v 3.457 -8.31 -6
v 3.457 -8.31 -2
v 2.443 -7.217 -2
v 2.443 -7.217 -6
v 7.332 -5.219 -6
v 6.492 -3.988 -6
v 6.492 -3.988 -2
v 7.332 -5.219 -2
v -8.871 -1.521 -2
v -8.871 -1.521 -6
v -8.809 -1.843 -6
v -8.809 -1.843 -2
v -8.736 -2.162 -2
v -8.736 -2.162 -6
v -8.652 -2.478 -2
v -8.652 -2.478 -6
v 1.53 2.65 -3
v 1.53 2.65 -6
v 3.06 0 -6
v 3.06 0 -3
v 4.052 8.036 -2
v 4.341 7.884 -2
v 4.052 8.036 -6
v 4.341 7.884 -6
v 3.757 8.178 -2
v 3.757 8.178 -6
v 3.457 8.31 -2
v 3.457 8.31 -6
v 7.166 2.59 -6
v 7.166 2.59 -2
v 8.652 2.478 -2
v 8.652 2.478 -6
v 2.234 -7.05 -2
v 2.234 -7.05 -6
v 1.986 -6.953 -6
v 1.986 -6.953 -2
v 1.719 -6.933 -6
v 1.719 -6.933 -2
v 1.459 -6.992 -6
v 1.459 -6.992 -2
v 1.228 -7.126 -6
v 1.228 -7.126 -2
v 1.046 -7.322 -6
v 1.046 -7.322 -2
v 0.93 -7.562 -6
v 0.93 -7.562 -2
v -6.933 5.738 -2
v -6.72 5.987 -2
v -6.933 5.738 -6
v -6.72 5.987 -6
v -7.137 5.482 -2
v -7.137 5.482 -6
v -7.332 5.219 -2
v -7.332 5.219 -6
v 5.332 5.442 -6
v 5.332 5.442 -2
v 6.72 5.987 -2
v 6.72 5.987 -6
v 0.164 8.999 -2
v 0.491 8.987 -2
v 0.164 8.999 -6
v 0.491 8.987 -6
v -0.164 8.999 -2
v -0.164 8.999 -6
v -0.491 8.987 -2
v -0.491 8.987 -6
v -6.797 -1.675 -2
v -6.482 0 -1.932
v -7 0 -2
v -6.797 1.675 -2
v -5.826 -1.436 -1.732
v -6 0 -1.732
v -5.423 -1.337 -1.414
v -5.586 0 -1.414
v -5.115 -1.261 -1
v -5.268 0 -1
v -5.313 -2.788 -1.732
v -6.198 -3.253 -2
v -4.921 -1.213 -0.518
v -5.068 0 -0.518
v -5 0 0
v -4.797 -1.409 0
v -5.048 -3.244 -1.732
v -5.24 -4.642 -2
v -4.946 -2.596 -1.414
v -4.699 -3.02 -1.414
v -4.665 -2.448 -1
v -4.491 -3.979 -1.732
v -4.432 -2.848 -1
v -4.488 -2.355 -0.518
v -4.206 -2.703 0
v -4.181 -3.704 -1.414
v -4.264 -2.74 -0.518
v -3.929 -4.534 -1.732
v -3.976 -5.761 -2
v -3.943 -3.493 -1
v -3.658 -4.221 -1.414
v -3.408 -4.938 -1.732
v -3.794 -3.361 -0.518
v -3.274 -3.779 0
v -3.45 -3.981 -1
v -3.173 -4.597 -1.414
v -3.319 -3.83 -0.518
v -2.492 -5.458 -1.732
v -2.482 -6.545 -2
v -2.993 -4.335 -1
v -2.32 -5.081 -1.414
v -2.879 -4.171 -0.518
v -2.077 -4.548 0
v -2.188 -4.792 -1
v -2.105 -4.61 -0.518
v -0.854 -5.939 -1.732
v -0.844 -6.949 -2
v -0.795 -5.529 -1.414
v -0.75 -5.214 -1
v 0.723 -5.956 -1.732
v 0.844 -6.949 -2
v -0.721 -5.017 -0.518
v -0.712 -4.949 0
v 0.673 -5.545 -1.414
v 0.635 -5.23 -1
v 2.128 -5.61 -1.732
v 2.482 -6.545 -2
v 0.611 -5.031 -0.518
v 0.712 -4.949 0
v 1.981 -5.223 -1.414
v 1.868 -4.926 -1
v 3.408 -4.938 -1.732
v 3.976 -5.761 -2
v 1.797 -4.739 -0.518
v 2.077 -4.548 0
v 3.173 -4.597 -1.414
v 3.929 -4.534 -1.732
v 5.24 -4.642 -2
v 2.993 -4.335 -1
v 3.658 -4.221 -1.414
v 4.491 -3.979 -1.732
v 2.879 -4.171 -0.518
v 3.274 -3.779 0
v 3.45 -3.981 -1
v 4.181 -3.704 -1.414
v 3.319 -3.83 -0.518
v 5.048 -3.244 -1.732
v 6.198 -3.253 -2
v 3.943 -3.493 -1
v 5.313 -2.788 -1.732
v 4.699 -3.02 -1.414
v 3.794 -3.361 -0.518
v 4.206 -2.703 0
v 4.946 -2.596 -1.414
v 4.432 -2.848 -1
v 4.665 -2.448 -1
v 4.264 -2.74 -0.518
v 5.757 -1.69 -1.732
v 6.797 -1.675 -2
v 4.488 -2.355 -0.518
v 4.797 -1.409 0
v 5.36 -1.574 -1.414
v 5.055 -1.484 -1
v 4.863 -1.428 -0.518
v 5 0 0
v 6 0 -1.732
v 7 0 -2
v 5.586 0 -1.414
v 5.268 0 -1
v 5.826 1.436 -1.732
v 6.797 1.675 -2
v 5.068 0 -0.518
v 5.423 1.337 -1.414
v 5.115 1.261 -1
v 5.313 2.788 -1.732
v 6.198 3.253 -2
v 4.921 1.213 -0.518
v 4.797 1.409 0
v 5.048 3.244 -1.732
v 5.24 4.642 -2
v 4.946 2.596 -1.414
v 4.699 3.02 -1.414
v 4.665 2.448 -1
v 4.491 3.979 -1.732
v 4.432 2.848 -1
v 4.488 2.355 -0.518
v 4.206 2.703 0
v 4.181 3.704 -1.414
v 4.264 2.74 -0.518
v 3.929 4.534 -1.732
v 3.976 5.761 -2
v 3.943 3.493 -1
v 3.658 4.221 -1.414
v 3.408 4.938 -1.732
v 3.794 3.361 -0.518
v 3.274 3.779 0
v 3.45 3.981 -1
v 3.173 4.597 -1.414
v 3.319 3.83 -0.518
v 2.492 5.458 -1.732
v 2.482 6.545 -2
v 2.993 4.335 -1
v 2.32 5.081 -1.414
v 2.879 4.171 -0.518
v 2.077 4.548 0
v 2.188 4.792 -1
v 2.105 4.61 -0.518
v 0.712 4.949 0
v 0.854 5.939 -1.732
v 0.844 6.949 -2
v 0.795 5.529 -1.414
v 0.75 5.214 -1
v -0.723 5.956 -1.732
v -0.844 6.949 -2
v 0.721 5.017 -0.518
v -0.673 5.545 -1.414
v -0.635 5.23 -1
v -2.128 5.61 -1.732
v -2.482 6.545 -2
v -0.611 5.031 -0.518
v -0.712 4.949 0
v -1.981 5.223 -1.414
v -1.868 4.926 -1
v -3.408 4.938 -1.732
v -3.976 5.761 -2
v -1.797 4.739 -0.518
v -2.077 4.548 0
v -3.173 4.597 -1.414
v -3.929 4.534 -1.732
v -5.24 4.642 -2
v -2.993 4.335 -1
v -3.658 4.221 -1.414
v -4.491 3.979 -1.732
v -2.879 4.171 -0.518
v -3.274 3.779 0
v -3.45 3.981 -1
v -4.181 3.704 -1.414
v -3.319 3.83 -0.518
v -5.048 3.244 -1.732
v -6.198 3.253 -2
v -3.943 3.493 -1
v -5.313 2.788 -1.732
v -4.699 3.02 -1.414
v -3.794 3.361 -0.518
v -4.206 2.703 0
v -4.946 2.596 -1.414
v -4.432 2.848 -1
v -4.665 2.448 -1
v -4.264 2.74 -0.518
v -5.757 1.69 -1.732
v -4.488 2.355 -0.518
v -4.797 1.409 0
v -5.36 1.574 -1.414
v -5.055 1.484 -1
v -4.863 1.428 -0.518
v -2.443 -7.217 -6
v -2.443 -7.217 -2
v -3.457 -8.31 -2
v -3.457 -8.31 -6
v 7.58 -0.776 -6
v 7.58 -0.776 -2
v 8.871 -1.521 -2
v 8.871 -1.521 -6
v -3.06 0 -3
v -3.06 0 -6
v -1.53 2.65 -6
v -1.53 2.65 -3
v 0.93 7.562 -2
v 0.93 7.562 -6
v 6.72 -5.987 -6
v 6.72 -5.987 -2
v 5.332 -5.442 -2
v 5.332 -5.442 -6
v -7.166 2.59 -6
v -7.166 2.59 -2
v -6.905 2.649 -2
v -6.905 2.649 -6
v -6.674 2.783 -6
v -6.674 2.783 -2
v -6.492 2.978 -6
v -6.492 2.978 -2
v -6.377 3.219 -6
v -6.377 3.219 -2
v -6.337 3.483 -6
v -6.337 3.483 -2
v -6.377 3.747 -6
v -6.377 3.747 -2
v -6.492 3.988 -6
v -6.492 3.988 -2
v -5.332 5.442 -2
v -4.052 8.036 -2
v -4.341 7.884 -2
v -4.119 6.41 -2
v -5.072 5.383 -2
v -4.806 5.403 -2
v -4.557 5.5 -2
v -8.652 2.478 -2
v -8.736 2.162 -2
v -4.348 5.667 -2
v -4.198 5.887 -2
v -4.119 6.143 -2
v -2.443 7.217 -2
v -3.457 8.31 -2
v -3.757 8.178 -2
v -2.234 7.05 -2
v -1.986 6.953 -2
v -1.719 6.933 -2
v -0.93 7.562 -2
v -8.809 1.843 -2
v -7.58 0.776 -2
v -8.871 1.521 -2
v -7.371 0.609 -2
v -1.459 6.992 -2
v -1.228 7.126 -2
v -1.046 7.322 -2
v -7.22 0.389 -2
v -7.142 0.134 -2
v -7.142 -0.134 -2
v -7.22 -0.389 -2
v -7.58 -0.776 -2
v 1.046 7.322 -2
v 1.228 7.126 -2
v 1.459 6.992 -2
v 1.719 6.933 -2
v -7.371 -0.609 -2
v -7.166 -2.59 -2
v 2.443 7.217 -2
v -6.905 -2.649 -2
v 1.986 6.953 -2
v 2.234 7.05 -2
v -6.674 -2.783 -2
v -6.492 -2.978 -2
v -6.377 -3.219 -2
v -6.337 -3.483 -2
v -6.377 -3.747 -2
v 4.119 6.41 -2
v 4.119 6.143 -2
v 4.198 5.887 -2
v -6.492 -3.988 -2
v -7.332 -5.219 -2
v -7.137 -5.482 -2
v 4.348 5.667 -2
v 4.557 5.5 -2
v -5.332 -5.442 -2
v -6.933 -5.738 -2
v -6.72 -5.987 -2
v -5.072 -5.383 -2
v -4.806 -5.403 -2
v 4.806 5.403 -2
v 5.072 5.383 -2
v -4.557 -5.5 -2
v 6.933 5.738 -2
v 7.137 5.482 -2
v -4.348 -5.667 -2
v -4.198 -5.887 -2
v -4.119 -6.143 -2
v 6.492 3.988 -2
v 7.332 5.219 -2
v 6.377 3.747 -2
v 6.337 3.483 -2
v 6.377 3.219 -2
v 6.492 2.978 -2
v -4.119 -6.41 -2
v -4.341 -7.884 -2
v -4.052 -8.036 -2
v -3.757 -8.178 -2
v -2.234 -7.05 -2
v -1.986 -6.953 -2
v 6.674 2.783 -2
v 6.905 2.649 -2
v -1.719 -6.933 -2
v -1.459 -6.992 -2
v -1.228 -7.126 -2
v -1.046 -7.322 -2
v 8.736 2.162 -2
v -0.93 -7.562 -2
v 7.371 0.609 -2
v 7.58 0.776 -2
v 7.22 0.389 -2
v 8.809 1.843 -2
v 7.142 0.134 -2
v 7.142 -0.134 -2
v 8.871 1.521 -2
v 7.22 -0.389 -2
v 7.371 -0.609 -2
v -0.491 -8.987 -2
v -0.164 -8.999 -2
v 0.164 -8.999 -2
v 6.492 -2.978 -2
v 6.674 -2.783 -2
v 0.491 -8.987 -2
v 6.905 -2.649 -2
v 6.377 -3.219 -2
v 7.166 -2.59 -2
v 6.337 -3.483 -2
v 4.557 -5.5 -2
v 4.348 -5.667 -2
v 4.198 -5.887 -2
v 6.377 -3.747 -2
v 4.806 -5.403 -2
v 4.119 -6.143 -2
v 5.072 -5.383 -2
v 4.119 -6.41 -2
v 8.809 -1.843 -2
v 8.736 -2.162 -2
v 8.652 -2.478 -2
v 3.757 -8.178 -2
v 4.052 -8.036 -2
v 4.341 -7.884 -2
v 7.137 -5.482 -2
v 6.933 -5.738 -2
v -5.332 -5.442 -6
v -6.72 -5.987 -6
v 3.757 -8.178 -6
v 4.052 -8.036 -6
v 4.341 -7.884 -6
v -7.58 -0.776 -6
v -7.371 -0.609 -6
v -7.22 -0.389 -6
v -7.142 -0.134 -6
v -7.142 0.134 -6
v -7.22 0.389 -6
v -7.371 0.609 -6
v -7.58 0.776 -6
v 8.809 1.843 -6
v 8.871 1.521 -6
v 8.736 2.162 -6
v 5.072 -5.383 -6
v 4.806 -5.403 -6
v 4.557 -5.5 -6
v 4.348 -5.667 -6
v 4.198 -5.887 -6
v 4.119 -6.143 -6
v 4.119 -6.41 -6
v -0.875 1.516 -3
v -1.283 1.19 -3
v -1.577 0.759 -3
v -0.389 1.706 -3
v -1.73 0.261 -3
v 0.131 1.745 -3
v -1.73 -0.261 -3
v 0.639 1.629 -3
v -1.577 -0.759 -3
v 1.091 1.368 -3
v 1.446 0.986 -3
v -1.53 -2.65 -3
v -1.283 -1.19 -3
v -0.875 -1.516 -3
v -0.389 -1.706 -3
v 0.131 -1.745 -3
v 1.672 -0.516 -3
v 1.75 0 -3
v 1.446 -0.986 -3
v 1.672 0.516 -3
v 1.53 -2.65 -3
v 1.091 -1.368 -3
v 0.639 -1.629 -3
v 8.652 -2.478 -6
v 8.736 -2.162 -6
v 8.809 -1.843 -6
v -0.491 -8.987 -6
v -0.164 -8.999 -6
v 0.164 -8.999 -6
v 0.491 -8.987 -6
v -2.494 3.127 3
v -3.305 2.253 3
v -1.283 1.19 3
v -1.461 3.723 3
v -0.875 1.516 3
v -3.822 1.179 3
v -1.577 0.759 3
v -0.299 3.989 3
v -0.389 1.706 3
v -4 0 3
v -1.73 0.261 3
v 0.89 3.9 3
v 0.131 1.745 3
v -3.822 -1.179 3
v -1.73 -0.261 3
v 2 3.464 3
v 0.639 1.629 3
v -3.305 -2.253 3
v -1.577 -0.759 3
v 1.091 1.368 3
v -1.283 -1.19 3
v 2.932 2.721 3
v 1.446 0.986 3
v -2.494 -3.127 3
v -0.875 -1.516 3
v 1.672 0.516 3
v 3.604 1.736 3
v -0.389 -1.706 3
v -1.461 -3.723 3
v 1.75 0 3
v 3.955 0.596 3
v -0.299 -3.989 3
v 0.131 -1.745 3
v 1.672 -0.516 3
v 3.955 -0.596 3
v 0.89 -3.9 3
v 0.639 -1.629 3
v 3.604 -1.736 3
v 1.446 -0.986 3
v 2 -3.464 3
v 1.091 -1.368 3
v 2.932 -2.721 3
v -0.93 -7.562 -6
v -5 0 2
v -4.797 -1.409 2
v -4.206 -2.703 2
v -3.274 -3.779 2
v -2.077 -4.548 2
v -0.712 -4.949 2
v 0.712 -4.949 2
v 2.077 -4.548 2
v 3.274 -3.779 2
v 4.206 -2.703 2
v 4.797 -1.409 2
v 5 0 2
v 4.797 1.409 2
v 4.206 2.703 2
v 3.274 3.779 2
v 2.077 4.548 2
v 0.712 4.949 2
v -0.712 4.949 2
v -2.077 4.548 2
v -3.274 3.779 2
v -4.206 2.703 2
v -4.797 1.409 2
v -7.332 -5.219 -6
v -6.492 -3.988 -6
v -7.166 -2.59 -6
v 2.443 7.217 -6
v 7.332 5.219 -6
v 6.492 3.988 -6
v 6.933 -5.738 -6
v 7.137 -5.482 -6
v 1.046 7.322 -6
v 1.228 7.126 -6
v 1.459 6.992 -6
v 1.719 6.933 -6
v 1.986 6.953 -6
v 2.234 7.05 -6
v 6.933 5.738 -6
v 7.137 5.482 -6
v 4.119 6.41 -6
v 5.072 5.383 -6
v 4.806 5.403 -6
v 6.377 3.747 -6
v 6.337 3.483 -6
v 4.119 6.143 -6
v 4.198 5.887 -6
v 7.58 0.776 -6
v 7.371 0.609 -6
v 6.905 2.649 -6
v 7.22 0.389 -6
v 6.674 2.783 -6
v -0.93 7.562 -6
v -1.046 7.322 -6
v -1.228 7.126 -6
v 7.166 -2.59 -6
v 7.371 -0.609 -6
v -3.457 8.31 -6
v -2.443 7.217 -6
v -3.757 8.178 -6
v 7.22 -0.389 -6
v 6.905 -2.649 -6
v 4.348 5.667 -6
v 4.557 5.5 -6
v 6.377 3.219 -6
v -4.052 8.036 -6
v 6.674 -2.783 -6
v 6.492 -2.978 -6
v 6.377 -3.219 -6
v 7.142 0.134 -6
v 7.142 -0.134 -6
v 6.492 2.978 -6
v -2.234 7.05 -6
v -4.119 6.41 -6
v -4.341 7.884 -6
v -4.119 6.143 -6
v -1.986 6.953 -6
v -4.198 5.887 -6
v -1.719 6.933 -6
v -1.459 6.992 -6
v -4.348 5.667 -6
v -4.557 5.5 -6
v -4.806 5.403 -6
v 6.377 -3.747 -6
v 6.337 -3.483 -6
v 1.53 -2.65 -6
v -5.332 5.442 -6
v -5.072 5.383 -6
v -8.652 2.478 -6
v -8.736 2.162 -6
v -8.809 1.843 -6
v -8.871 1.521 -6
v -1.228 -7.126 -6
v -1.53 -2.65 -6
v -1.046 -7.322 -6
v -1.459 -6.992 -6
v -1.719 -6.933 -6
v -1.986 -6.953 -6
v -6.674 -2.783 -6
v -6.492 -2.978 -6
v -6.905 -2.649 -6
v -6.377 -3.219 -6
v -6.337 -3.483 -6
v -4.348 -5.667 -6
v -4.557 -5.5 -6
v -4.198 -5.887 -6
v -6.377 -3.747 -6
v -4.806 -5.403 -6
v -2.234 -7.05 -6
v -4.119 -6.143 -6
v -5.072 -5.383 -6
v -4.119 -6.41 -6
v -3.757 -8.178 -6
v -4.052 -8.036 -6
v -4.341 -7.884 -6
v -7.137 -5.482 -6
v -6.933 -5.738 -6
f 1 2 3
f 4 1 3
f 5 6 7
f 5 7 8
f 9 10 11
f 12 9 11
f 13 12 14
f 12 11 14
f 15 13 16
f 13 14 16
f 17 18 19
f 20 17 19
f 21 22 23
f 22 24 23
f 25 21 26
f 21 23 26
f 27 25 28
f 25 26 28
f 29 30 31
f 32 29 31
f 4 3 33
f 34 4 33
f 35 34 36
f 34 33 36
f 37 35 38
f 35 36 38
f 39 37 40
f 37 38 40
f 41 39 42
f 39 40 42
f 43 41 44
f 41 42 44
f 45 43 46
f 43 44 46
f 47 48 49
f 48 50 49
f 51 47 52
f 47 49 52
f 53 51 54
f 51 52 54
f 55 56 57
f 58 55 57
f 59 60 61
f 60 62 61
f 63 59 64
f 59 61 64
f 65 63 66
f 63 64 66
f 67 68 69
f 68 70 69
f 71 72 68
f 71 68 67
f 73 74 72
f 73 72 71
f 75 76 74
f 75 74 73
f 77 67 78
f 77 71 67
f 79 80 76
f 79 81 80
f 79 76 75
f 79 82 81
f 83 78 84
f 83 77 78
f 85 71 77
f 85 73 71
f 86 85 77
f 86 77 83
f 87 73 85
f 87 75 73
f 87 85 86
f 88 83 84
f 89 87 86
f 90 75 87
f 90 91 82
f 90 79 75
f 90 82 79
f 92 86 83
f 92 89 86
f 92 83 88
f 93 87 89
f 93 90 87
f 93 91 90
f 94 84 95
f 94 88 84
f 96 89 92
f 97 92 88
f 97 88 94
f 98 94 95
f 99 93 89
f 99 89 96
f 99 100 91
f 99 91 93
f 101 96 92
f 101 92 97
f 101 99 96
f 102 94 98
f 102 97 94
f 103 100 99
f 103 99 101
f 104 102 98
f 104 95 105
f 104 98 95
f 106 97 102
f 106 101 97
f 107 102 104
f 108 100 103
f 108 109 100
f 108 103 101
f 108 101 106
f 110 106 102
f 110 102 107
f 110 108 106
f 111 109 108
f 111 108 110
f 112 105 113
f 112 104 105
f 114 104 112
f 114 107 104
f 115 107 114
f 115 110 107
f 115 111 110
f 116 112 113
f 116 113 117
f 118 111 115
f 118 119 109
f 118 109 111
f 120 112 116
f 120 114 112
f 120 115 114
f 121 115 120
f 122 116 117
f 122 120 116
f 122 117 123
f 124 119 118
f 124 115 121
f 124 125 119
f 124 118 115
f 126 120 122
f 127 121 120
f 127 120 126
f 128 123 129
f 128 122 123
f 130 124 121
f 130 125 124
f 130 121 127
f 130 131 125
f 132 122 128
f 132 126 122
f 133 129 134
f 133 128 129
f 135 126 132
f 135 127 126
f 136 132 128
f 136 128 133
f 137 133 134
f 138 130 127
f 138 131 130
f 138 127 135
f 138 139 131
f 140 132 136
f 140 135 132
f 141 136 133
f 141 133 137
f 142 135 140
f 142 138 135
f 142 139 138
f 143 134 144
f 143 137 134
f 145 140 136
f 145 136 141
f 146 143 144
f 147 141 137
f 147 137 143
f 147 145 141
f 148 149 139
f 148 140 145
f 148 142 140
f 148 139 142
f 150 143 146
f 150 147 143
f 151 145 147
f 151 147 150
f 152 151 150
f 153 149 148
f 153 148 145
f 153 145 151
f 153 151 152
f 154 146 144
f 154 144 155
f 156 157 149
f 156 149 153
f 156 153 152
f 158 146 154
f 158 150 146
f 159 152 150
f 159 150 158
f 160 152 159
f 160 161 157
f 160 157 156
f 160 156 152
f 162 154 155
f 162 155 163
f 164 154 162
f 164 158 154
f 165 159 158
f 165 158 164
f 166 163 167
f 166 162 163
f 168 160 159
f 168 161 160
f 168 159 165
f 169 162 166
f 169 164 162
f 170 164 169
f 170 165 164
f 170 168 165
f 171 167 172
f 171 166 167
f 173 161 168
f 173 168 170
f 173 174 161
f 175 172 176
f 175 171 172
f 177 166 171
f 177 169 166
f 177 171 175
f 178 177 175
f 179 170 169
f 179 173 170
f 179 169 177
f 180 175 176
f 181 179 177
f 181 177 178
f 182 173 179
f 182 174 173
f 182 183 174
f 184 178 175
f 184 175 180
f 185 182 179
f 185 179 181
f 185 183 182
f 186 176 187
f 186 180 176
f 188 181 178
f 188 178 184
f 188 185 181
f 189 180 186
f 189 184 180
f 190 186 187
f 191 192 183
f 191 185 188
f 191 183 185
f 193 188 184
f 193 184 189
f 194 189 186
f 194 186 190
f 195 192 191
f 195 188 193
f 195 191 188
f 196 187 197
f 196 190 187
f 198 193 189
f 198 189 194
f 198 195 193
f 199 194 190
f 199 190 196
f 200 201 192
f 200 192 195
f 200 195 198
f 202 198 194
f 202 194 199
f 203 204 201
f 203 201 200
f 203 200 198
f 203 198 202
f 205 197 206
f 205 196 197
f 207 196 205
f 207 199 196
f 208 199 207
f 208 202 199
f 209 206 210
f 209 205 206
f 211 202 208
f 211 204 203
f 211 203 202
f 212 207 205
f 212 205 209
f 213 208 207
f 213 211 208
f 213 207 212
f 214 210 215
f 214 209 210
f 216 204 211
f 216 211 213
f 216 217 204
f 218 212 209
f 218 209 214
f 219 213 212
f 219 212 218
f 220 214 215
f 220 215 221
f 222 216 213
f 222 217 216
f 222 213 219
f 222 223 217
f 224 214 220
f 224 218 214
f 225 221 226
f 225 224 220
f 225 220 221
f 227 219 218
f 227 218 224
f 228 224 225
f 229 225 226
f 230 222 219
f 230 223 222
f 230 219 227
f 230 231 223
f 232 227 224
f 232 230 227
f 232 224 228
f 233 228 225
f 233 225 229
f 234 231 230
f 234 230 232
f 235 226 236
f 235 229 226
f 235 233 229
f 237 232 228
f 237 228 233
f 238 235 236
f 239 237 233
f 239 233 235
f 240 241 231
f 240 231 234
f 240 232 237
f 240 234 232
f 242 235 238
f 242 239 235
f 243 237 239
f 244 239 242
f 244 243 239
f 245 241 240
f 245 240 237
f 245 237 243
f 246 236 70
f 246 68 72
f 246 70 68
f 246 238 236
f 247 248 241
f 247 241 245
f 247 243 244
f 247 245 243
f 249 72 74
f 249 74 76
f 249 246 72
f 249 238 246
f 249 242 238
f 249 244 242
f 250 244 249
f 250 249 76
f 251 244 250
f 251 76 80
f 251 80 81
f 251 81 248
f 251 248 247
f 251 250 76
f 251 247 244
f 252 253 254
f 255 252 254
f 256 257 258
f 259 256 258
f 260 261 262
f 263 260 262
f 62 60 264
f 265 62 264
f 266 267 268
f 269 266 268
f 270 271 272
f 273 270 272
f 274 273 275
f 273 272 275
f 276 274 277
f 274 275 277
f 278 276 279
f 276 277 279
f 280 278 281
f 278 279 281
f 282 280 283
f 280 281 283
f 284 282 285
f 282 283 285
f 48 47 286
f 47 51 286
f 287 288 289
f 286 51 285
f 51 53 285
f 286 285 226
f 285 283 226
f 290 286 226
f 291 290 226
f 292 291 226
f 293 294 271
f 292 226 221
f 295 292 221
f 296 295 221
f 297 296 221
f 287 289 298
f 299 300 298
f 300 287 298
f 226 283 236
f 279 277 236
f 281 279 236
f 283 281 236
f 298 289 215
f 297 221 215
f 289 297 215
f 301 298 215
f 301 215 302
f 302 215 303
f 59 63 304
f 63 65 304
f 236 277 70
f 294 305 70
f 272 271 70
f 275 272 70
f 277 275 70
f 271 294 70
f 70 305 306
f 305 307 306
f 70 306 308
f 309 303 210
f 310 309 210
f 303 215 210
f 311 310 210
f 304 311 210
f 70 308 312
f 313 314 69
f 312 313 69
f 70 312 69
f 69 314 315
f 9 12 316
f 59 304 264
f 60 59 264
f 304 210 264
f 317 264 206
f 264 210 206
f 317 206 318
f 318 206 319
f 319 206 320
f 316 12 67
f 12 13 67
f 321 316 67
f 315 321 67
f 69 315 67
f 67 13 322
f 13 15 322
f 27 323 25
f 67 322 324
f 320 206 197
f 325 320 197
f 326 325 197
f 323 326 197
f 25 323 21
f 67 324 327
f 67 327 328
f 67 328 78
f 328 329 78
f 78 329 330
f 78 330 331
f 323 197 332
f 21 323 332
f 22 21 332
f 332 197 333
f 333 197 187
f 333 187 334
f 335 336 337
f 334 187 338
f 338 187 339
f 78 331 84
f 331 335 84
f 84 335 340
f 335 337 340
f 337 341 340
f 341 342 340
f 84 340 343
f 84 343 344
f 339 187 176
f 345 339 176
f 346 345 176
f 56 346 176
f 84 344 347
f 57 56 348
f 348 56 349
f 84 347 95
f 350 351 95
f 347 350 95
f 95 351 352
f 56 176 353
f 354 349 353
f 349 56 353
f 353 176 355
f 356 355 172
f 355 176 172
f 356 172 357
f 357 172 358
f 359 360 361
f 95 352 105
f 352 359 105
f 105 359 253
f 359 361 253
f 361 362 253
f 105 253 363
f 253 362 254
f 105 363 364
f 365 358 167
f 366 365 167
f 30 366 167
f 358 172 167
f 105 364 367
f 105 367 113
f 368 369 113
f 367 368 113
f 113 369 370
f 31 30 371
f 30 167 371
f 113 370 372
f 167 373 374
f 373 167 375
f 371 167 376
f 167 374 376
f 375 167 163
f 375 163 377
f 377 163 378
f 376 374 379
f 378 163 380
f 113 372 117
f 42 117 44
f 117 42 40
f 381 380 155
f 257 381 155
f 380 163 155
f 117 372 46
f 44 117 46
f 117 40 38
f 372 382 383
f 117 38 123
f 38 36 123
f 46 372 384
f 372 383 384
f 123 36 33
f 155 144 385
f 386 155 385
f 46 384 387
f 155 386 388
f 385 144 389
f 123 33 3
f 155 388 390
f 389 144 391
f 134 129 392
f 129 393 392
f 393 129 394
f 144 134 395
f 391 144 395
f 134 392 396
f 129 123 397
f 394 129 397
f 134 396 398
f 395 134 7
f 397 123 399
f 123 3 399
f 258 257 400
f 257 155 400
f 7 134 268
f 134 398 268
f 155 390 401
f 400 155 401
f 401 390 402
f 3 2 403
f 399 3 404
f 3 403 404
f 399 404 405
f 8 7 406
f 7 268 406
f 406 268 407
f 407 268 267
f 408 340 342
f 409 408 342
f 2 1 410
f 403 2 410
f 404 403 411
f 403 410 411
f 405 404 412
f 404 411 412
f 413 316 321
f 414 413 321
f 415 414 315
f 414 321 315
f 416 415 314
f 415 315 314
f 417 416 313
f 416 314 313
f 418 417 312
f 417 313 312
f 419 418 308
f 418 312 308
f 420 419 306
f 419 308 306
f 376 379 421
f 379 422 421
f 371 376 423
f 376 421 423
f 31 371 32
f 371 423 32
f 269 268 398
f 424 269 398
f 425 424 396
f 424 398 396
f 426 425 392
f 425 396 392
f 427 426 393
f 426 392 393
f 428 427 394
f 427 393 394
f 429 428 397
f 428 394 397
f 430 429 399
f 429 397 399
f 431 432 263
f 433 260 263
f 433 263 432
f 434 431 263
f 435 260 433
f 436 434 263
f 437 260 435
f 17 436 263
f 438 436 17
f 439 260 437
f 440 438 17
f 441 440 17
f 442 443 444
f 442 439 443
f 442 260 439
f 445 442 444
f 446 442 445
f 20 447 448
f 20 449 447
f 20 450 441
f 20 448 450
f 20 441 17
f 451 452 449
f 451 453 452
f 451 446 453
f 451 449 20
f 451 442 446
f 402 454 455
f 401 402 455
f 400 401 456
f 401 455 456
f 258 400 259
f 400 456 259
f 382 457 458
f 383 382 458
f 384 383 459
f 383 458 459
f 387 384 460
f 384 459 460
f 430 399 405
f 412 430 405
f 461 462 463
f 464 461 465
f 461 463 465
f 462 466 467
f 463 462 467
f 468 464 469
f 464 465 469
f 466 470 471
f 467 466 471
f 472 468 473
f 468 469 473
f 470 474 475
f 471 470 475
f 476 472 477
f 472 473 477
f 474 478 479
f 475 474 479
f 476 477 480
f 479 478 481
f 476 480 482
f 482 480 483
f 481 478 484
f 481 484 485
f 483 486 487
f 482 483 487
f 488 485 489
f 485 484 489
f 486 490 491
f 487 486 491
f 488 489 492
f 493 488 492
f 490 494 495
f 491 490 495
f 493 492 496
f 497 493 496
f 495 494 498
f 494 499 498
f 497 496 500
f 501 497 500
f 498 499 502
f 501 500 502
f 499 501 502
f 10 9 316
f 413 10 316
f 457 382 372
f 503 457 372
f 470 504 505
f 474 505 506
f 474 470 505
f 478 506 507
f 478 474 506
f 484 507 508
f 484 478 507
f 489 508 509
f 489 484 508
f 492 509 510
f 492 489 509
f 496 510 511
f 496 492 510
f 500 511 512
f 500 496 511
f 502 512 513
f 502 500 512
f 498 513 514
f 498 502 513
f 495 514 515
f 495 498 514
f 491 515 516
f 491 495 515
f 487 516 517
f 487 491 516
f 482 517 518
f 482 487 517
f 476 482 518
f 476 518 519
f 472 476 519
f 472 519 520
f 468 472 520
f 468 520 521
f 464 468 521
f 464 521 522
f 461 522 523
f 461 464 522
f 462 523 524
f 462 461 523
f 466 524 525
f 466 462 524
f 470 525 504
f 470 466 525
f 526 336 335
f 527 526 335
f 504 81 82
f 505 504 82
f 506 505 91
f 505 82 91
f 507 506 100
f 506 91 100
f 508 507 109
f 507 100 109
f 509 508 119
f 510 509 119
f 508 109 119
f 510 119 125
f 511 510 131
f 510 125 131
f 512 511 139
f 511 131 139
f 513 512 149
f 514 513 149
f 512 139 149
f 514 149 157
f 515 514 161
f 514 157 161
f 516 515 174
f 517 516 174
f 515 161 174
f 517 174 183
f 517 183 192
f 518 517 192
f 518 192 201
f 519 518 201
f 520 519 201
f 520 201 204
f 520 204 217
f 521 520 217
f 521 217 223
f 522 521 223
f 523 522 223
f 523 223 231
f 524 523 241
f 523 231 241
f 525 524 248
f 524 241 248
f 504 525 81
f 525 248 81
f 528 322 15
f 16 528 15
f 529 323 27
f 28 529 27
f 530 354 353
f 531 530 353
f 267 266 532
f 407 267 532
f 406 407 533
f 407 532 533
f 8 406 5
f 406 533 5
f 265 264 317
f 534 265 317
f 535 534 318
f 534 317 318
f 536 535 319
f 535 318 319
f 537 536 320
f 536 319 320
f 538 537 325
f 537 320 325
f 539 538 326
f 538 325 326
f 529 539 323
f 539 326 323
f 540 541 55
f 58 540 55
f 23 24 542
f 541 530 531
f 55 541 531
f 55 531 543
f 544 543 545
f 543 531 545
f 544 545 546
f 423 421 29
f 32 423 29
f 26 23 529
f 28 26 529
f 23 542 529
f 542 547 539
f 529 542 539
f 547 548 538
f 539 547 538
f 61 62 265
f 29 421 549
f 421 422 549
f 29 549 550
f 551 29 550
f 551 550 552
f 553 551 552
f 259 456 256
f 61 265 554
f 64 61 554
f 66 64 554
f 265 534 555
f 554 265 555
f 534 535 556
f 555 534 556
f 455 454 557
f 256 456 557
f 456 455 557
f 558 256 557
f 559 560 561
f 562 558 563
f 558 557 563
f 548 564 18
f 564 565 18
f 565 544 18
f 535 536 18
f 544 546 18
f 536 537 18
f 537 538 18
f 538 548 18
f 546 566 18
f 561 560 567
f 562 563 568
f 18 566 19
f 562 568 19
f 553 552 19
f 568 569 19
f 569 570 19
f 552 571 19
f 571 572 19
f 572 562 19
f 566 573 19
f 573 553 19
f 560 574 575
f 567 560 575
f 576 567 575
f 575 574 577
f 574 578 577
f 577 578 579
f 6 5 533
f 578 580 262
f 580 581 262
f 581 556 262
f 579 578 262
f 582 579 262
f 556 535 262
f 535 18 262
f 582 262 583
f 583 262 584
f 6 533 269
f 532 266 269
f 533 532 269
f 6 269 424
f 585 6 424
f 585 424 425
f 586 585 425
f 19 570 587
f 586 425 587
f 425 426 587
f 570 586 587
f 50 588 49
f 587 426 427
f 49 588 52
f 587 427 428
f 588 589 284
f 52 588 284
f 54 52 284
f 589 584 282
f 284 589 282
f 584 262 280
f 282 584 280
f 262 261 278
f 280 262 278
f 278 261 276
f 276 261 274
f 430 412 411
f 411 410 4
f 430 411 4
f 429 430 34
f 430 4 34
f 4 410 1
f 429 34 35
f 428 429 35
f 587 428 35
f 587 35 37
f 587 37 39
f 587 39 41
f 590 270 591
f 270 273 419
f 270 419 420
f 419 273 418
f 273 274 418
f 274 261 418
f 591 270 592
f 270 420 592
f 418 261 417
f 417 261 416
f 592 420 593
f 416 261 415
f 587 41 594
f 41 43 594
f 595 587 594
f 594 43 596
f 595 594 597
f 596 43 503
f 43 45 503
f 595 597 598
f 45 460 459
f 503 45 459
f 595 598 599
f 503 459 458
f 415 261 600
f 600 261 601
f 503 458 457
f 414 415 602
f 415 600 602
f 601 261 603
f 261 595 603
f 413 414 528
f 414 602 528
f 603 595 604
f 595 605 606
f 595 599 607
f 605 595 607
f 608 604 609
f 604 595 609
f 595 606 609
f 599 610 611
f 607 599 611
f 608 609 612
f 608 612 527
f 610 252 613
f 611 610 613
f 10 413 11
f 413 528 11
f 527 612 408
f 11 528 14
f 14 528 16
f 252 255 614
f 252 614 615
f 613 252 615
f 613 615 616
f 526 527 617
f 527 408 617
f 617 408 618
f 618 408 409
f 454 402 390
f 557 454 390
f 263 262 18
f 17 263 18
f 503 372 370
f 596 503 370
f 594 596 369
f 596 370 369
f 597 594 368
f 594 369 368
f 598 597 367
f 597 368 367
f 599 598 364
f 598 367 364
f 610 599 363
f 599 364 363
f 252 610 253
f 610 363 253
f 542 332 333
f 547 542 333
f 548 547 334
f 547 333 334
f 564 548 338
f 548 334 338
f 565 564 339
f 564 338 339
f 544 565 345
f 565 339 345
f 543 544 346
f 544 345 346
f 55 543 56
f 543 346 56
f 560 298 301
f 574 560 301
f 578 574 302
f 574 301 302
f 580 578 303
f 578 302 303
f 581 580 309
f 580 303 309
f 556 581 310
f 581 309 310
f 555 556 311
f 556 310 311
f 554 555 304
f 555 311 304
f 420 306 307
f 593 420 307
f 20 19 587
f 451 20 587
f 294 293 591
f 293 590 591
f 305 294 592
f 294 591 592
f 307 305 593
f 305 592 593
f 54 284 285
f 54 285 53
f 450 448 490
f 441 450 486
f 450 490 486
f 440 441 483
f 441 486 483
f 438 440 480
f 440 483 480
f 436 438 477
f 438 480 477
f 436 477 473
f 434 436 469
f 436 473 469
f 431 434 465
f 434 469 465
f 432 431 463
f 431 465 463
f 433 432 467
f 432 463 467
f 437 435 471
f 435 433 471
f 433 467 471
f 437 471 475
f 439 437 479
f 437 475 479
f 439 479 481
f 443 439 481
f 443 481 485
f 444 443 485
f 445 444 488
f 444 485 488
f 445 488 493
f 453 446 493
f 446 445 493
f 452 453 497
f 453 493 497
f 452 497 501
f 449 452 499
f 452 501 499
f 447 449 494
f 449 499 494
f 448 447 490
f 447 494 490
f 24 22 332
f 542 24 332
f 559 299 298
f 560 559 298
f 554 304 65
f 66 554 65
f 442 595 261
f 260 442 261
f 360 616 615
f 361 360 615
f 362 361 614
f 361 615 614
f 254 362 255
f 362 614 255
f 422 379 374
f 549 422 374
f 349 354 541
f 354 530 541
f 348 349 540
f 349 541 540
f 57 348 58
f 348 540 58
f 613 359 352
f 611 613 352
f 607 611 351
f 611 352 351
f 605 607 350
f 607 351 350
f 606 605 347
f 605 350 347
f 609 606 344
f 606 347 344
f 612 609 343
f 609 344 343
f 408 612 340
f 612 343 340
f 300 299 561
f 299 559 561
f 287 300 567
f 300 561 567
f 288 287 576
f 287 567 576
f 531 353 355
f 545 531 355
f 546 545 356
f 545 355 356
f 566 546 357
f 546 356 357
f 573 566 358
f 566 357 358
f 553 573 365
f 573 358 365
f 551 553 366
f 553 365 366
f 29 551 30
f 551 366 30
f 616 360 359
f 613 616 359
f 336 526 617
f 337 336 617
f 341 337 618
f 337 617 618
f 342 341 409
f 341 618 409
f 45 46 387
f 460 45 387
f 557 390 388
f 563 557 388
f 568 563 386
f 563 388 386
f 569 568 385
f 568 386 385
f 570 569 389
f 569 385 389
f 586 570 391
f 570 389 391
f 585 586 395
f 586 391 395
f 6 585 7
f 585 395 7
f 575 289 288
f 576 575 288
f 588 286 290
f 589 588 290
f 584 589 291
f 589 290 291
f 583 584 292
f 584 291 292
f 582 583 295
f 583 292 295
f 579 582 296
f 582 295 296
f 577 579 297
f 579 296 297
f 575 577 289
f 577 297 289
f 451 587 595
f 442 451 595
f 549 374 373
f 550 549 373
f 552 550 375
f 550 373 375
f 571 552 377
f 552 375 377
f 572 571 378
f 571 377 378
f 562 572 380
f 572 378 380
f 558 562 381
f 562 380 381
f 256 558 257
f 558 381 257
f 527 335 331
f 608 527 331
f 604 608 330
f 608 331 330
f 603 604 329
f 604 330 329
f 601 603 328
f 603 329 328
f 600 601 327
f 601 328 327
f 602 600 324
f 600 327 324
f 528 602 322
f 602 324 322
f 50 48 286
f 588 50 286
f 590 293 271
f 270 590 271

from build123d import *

# Parameters (mm, degrees)
F2_R     = 1.75
F3_DEPTH = 12.5
F5_R     = 2
F7_DEPTH = 10
F8_R     = 1.75
F9_DEPTH = 3
F10_SIZE = 1


with BuildPart() as f1:
    # F0 (on Front) → F1 (revolve)
    with BuildSketch(Plane.XZ):
        Polygon((-9, -6), (0, -6), (0, 3), (-5, 3), (-5, -2), (-9, -2), align=None)
    revolve(axis=Axis((0, 0, -1.5), (0, 0, 1)))


with BuildPart() as f3:
    # F2 (on Top) → F3 (new body, symmetric)
    with BuildSketch(Plane.XY):
        Circle(F2_R)
    extrude(amount=F3_DEPTH, both=True)


with BuildPart() as f1_1:
    add(f1.part)

    # F4: cut F3
    add(f3.part, mode=Mode.SUBTRACT)

    # F5
    f5_edges = [f1_1.edges().sort_by_distance(p)[0] for p in [
        (5, 0, -2),
    ]]
    fillet(f5_edges, radius=F5_R)

    # F6 (on Top) → F7 (cut)
    with BuildSketch(Plane.XY):
        with BuildLine():
            ThreePointArc((-7.5796, -0.775802), (-7.13169, 0), (-7.5796, 0.775802))
            Line((-7.5796, 0.775802), (-10.312837, 2.353838))
            Line((-10.312837, 2.353838), (-10.499112, 2.339878))
            Line((-10.499112, 2.339878), (-10.499112, -2.339878))
            Line((-10.499112, -2.339878), (-10.312837, -2.353838))
            Line((-10.312837, -2.353838), (-7.5796, -0.775802))
        make_face()
        with BuildLine():
            Line((-10.474608, 2.447236), (-10.312837, 2.353838))
            Line((-10.312837, 2.353838), (-7.165591, 2.589691))
            ThreePointArc((-7.165591, 2.589691), (-6.425431, 3.094324), (-6.492375, 3.987639))
            Line((-6.492375, 3.987639), (-8.270253, 6.595307))
            Line((-8.270253, 6.595307), (-8.444138, 6.663552))
            Line((-8.444138, 6.663552), (-10.474608, 2.447236))
        make_face()
        Polygon((-10.499112, 2.396354), (-10.474608, 2.447236), (-10.499112, 2.461384), align=None)
        Polygon((-10.527328, 2.337764), (-10.499112, 2.339878), (-10.499112, 2.396354), align=None)
        with BuildLine():
            Line((-7.165591, -2.589691), (-10.312837, -2.353838))
            Line((-10.312837, -2.353838), (-10.474608, -2.447236))
            Line((-10.474608, -2.447236), (-8.444138, -6.663552))
            Line((-8.444138, -6.663552), (-8.270253, -6.595307))
            Line((-8.270253, -6.595307), (-6.492375, -3.987639))
            ThreePointArc((-6.492375, -3.987639), (-6.425431, -3.094324), (-7.165591, -2.589691))
        make_face()
        Polygon((-8.470477, 6.673889), (-8.444138, 6.663552), (-8.419634, 6.714434), align=None)
        Polygon((-10.499112, -2.396354), (-10.499112, -2.339878), (-10.527328, -2.337764), align=None)
        Polygon((-10.499112, -2.461384), (-10.474608, -2.447236), (-10.499112, -2.396354), align=None)
        with BuildLine():
            Line((-8.37548, 6.749646), (-8.270253, 6.595307))
            Line((-8.270253, 6.595307), (-5.33235, 5.442265))
            ThreePointArc((-5.33235, 5.442265), (-4.446536, 5.57578), (-4.119256, 6.409674))
            Line((-4.119256, 6.409674), (-4.589644, 9.530495))
            Line((-4.589644, 9.530495), (-4.716699, 9.667427))
            Line((-4.716699, 9.667427), (-8.37548, 6.749646))
        make_face()
        Polygon((-8.391419, 6.773024), (-8.419634, 6.714434), (-8.37548, 6.749646), align=None)
        Polygon((-8.419634, -6.714434), (-8.444138, -6.663552), (-8.470477, -6.673889), align=None)
        Polygon((-8.37548, -6.749646), (-8.419634, -6.714434), (-8.391419, -6.773024), align=None)
        with BuildLine():
            Line((-5.33235, -5.442265), (-8.270253, -6.595307))
            Line((-8.270253, -6.595307), (-8.37548, -6.749646))
            Line((-8.37548, -6.749646), (-4.716699, -9.667427))
            Line((-4.716699, -9.667427), (-4.589644, -9.530495))
            Line((-4.589644, -9.530495), (-4.119256, -6.409674))
            ThreePointArc((-4.119256, -6.409674), (-4.446536, -5.57578), (-5.33235, -5.442265))
        make_face()
        Polygon((-4.735944, 9.688168), (-4.716699, 9.667427), (-4.672544, 9.702639), align=None)
        with BuildLine():
            Line((-4.617485, 9.715206), (-4.589644, 9.530495))
            Line((-4.589644, 9.530495), (-2.442971, 7.216931))
            ThreePointArc((-2.442971, 7.216931), (-1.58695, 6.952884), (-0.930268, 7.562195))
            Line((-0.930268, 7.562195), (0, 10.578051))
            Line((0, 10.578051), (-0.055059, 10.756549))
            Line((-0.055059, 10.756549), (-4.617485, 9.715206))
        make_face()
        Polygon((-4.621702, 9.743184), (-4.672544, 9.702639), (-4.617485, 9.715206), align=None)
        Polygon((-4.672544, -9.702639), (-4.716699, -9.667427), (-4.735944, -9.688168), align=None)
        Polygon((-4.617485, -9.715206), (-4.672544, -9.702639), (-4.621702, -9.743184), align=None)
        with BuildLine():
            Line((-2.442971, -7.216931), (-4.589644, -9.530495))
            Line((-4.589644, -9.530495), (-4.617485, -9.715206))
            Line((-4.617485, -9.715206), (-0.055059, -10.756549))
            Line((-0.055059, -10.756549), (0, -10.578051))
            Line((0, -10.578051), (-0.930268, -7.562195))
            ThreePointArc((-0.930268, -7.562195), (-1.58695, -6.952884), (-2.442971, -7.216931))
        make_face()
        Polygon((-0.063399, 10.783587), (-0.055059, 10.756549), (0, 10.769116), align=None)
        with BuildLine():
            Line((0.055059, 10.756549), (0, 10.578051))
            Line((0, 10.578051), (0.930268, 7.562195))
            ThreePointArc((0.930268, 7.562195), (1.58695, 6.952884), (2.442971, 7.216931))
            Line((2.442971, 7.216931), (4.589644, 9.530495))
            Line((4.589644, 9.530495), (4.617485, 9.715206))
            Line((4.617485, 9.715206), (0.055059, 10.756549))
        make_face()
        Polygon((0.063399, 10.783587), (0, 10.769116), (0.055059, 10.756549), align=None)
        Polygon((0, -10.769116), (-0.055059, -10.756549), (-0.063399, -10.783587), align=None)
        Polygon((0.055059, -10.756549), (0, -10.769116), (0.063399, -10.783587), align=None)
        with BuildLine():
            Line((0.930268, -7.562195), (0, -10.578051))
            Line((0, -10.578051), (0.055059, -10.756549))
            Line((0.055059, -10.756549), (4.617485, -9.715206))
            Line((4.617485, -9.715206), (4.589644, -9.530495))
            Line((4.589644, -9.530495), (2.442971, -7.216931))
            ThreePointArc((2.442971, -7.216931), (1.58695, -6.952884), (0.930268, -7.562195))
        make_face()
        Polygon((4.621702, 9.743184), (4.617485, 9.715206), (4.672544, 9.702639), align=None)
        with BuildLine():
            Line((4.716699, 9.667427), (4.589644, 9.530495))
            Line((4.589644, 9.530495), (4.119256, 6.409674))
            ThreePointArc((4.119256, 6.409674), (4.446536, 5.57578), (5.33235, 5.442265))
            Line((5.33235, 5.442265), (8.270253, 6.595307))
            Line((8.270253, 6.595307), (8.37548, 6.749646))
            Line((8.37548, 6.749646), (4.716699, 9.667427))
        make_face()
        Polygon((4.735944, 9.688168), (4.672544, 9.702639), (4.716699, 9.667427), align=None)
        Polygon((4.672544, -9.702639), (4.617485, -9.715206), (4.621702, -9.743184), align=None)
        Polygon((4.716699, -9.667427), (4.672544, -9.702639), (4.735944, -9.688168), align=None)
        with BuildLine():
            Line((4.119256, -6.409674), (4.589644, -9.530495))
            Line((4.589644, -9.530495), (4.716699, -9.667427))
            Line((4.716699, -9.667427), (8.37548, -6.749646))
            Line((8.37548, -6.749646), (8.270253, -6.595307))
            Line((8.270253, -6.595307), (5.33235, -5.442265))
            ThreePointArc((5.33235, -5.442265), (4.446536, -5.57578), (4.119256, -6.409674))
        make_face()
        Polygon((8.391419, 6.773024), (8.37548, 6.749646), (8.419634, 6.714434), align=None)
        with BuildLine():
            Line((8.444138, 6.663552), (8.270253, 6.595307))
            Line((8.270253, 6.595307), (6.492375, 3.987639))
            ThreePointArc((6.492375, 3.987639), (6.425431, 3.094324), (7.165591, 2.589691))
            Line((7.165591, 2.589691), (10.312837, 2.353838))
            Line((10.312837, 2.353838), (10.474608, 2.447236))
            Line((10.474608, 2.447236), (8.444138, 6.663552))
        make_face()
        Polygon((8.470477, 6.673889), (8.419634, 6.714434), (8.444138, 6.663552), align=None)
        Polygon((8.419634, -6.714434), (8.37548, -6.749646), (8.391419, -6.773024), align=None)
        Polygon((8.444138, -6.663552), (8.419634, -6.714434), (8.470477, -6.673889), align=None)
        with BuildLine():
            Line((6.492375, -3.987639), (8.270253, -6.595307))
            Line((8.270253, -6.595307), (8.444138, -6.663552))
            Line((8.444138, -6.663552), (10.474608, -2.447236))
            Line((10.474608, -2.447236), (10.312837, -2.353838))
            Line((10.312837, -2.353838), (7.165591, -2.589691))
            ThreePointArc((7.165591, -2.589691), (6.425431, -3.094324), (6.492375, -3.987639))
        make_face()
        Polygon((10.499112, 2.461384), (10.474608, 2.447236), (10.499112, 2.396354), align=None)
        with BuildLine():
            Line((10.499112, 2.339878), (10.312837, 2.353838))
            Line((10.312837, 2.353838), (7.5796, 0.775802))
            ThreePointArc((7.5796, 0.775802), (7.13169, 0), (7.5796, -0.775802))
            Line((7.5796, -0.775802), (10.312837, -2.353838))
            Line((10.312837, -2.353838), (10.499112, -2.339878))
            Line((10.499112, -2.339878), (10.499112, 2.339878))
        make_face()
        Polygon((10.527328, 2.337764), (10.499112, 2.396354), (10.499112, 2.339878), align=None)
        Polygon((10.499112, -2.396354), (10.474608, -2.447236), (10.499112, -2.461384), align=None)
        Polygon((10.499112, -2.339878), (10.499112, -2.396354), (10.527328, -2.337764), align=None)
    extrude(amount=-F7_DEPTH, mode=Mode.SUBTRACT)

    # F8 (on face) → F9 (cut)
    with BuildSketch(Plane(origin=(0, 0, -6), x_dir=(1, 0, 0), z_dir=(0, 0, -1))):
        Polygon((-1.529978, -2.65), (1.529978, -2.65), (3.059956, 0), (1.529978, 2.65), (-1.529978, 2.65), (-3.059956, 0), align=None)
        Circle(F8_R, mode=Mode.SUBTRACT)
    extrude(amount=-F9_DEPTH, mode=Mode.SUBTRACT)

    # F10
    f10_edges = [f1_1.edges().sort_by_distance(p)[0] for p in [
        (5, 0, 3),
    ]]
    chamfer(f10_edges, length=F10_SIZE)


solid = f1_1.part
